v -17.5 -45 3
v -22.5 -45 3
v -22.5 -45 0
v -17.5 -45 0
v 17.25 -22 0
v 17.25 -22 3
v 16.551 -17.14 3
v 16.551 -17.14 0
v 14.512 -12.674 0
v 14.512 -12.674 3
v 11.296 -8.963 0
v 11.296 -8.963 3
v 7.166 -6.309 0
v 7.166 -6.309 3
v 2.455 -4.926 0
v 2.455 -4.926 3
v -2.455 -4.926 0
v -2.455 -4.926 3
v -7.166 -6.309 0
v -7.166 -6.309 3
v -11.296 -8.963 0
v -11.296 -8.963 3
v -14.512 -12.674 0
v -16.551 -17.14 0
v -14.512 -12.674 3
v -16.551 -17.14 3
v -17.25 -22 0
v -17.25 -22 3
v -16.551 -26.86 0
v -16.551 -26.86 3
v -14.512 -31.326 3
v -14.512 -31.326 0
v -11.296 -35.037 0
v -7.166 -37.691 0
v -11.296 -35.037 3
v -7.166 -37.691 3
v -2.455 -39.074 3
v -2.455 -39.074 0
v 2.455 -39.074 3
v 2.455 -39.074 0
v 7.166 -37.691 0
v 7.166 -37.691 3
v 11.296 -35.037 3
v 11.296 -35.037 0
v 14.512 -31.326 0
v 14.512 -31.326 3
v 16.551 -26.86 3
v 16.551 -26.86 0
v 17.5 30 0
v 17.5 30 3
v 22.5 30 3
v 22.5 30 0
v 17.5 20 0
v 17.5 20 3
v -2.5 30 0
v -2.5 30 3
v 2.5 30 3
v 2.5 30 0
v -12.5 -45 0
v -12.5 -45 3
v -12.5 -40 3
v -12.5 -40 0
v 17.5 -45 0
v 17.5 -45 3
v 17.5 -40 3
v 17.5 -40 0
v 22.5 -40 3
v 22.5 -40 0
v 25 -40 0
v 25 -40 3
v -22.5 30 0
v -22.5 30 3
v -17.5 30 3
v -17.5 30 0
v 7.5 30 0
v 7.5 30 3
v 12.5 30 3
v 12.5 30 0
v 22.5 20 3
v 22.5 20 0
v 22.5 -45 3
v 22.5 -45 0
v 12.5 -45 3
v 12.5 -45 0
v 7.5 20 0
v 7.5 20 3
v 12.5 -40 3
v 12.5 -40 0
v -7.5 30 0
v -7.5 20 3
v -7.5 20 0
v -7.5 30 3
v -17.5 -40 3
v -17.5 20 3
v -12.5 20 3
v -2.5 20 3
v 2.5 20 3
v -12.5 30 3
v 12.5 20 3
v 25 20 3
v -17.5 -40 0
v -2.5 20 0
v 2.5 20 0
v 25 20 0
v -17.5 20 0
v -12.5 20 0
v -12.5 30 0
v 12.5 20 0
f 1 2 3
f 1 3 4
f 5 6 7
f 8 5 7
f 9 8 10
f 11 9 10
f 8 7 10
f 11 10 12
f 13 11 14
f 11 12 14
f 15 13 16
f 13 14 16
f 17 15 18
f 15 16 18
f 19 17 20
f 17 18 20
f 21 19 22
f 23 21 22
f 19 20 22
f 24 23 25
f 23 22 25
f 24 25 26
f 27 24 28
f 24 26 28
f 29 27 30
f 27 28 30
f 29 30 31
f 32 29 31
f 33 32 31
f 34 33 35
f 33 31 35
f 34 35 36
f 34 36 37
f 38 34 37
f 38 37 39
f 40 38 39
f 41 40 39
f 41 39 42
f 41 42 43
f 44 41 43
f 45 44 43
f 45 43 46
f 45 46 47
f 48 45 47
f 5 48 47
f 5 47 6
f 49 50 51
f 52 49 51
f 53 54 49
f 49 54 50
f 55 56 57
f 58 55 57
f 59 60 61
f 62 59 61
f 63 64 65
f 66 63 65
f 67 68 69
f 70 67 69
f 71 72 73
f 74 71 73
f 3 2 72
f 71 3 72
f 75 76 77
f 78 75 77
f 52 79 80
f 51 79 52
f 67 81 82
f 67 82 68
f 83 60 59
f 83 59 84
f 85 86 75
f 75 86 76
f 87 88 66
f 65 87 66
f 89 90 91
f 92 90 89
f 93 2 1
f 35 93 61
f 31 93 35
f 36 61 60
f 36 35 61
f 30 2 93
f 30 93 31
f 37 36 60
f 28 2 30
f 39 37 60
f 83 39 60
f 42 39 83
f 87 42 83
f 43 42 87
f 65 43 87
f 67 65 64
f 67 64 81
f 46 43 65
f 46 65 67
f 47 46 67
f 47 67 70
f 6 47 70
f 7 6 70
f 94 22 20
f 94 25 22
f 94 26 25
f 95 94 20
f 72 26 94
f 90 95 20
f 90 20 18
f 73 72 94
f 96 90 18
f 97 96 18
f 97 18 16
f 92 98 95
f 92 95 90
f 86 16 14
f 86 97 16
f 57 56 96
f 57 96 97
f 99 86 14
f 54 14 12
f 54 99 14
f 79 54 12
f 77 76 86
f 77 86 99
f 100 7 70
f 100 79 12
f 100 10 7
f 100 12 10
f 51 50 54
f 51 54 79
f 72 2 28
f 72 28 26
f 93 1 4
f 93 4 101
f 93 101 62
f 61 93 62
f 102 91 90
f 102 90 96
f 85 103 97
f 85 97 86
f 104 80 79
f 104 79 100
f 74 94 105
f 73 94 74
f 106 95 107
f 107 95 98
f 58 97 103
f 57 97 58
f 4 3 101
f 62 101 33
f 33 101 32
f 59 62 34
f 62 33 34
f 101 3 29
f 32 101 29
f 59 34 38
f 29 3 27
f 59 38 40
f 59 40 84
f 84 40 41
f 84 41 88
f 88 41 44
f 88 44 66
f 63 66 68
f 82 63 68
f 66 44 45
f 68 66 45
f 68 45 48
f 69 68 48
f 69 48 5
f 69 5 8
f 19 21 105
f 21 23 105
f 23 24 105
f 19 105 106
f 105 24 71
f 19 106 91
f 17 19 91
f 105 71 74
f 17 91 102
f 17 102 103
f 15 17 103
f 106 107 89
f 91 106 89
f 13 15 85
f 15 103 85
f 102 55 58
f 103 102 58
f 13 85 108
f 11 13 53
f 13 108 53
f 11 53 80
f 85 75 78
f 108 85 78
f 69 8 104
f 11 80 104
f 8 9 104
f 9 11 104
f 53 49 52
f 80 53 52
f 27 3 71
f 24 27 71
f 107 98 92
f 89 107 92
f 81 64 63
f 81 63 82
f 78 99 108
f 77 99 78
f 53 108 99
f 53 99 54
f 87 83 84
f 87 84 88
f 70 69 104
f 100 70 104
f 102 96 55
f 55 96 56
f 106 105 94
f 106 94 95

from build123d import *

# Parameters (mm, degrees)
ESQUISSE3_W                = 50
ESQUISSE3_H                = 60
BOSS_EXTRU_12_DEPTH        = 3
ESQUISSE4_R                = 17.25
ENL_V_MAT_EXTRU_1_DEPTH    = 5
ESQUISSE5_W                = 5
ESQUISSE5_H                = 10
ESQUISSE5_H_2              = 5
BOSS_EXTRU_13_DEPTH        = 3
R_P_TITION_LIN_AIRE1_COUNT = 5
R_P_TITION_LIN_AIRE1_PITCH = 10
ESQUISSE6_W                = 5
ESQUISSE6_H                = 5
BOSS_EXTRU_14_DEPTH        = 3
ESQUISSE7_W                = 2.5
ESQUISSE7_H                = 60
ENL_V_MAT_EXTRU_2_DEPTH    = 10


with BuildPart() as part:
    # Esquisse3 → Boss.-Extru.12 (new body)
    with BuildSketch(Plane.XY):
        with Locations((0, -10)):
            Rectangle(ESQUISSE3_W, ESQUISSE3_H)
    extrude(amount=BOSS_EXTRU_12_DEPTH)

    # Esquisse4 → Enlèv. mat.-Extru.1 (cut)
    with BuildSketch(Plane.XY.offset(3)):
        with Locations((0, -22)):
            Circle(ESQUISSE4_R)
    extrude(amount=-ENL_V_MAT_EXTRU_1_DEPTH, mode=Mode.SUBTRACT)

    # Esquisse5 → Boss.-Extru.13 (add)
    with BuildSketch(Plane.XY.offset(3)):
        with Locations((-20, 25)):
            Rectangle(ESQUISSE5_W, ESQUISSE5_H)
        with Locations((-20, -42.5)):
            Rectangle(ESQUISSE5_W, ESQUISSE5_H_2)
    boss_extru_13 = extrude(amount=-BOSS_EXTRU_13_DEPTH)

    # Répétition linéaire1: Boss.-Extru.13 ×5
    with Locations(*[(i * R_P_TITION_LIN_AIRE1_PITCH, 0, 0) for i in range(1, R_P_TITION_LIN_AIRE1_COUNT)]):
        add(boss_extru_13)

    # Esquisse6 → Boss.-Extru.14 (add)
    with BuildSketch(Plane.XY.offset(3)):
        with Locations((-5, -42.5)):
            Rectangle(ESQUISSE6_W, ESQUISSE6_H)
        with Locations((5, -42.5)):
            Rectangle(ESQUISSE6_W, ESQUISSE6_H)
    extrude(amount=-BOSS_EXTRU_14_DEPTH)

    # Esquisse7 → Enlèv. mat.-Extru.2 (cut)
    with BuildSketch(Plane.XY.offset(3)):
        with Locations((-23.75, -10)):
            Rectangle(ESQUISSE7_W, ESQUISSE7_H)
    extrude(amount=-ENL_V_MAT_EXTRU_2_DEPTH, mode=Mode.SUBTRACT)


solid = part.part
